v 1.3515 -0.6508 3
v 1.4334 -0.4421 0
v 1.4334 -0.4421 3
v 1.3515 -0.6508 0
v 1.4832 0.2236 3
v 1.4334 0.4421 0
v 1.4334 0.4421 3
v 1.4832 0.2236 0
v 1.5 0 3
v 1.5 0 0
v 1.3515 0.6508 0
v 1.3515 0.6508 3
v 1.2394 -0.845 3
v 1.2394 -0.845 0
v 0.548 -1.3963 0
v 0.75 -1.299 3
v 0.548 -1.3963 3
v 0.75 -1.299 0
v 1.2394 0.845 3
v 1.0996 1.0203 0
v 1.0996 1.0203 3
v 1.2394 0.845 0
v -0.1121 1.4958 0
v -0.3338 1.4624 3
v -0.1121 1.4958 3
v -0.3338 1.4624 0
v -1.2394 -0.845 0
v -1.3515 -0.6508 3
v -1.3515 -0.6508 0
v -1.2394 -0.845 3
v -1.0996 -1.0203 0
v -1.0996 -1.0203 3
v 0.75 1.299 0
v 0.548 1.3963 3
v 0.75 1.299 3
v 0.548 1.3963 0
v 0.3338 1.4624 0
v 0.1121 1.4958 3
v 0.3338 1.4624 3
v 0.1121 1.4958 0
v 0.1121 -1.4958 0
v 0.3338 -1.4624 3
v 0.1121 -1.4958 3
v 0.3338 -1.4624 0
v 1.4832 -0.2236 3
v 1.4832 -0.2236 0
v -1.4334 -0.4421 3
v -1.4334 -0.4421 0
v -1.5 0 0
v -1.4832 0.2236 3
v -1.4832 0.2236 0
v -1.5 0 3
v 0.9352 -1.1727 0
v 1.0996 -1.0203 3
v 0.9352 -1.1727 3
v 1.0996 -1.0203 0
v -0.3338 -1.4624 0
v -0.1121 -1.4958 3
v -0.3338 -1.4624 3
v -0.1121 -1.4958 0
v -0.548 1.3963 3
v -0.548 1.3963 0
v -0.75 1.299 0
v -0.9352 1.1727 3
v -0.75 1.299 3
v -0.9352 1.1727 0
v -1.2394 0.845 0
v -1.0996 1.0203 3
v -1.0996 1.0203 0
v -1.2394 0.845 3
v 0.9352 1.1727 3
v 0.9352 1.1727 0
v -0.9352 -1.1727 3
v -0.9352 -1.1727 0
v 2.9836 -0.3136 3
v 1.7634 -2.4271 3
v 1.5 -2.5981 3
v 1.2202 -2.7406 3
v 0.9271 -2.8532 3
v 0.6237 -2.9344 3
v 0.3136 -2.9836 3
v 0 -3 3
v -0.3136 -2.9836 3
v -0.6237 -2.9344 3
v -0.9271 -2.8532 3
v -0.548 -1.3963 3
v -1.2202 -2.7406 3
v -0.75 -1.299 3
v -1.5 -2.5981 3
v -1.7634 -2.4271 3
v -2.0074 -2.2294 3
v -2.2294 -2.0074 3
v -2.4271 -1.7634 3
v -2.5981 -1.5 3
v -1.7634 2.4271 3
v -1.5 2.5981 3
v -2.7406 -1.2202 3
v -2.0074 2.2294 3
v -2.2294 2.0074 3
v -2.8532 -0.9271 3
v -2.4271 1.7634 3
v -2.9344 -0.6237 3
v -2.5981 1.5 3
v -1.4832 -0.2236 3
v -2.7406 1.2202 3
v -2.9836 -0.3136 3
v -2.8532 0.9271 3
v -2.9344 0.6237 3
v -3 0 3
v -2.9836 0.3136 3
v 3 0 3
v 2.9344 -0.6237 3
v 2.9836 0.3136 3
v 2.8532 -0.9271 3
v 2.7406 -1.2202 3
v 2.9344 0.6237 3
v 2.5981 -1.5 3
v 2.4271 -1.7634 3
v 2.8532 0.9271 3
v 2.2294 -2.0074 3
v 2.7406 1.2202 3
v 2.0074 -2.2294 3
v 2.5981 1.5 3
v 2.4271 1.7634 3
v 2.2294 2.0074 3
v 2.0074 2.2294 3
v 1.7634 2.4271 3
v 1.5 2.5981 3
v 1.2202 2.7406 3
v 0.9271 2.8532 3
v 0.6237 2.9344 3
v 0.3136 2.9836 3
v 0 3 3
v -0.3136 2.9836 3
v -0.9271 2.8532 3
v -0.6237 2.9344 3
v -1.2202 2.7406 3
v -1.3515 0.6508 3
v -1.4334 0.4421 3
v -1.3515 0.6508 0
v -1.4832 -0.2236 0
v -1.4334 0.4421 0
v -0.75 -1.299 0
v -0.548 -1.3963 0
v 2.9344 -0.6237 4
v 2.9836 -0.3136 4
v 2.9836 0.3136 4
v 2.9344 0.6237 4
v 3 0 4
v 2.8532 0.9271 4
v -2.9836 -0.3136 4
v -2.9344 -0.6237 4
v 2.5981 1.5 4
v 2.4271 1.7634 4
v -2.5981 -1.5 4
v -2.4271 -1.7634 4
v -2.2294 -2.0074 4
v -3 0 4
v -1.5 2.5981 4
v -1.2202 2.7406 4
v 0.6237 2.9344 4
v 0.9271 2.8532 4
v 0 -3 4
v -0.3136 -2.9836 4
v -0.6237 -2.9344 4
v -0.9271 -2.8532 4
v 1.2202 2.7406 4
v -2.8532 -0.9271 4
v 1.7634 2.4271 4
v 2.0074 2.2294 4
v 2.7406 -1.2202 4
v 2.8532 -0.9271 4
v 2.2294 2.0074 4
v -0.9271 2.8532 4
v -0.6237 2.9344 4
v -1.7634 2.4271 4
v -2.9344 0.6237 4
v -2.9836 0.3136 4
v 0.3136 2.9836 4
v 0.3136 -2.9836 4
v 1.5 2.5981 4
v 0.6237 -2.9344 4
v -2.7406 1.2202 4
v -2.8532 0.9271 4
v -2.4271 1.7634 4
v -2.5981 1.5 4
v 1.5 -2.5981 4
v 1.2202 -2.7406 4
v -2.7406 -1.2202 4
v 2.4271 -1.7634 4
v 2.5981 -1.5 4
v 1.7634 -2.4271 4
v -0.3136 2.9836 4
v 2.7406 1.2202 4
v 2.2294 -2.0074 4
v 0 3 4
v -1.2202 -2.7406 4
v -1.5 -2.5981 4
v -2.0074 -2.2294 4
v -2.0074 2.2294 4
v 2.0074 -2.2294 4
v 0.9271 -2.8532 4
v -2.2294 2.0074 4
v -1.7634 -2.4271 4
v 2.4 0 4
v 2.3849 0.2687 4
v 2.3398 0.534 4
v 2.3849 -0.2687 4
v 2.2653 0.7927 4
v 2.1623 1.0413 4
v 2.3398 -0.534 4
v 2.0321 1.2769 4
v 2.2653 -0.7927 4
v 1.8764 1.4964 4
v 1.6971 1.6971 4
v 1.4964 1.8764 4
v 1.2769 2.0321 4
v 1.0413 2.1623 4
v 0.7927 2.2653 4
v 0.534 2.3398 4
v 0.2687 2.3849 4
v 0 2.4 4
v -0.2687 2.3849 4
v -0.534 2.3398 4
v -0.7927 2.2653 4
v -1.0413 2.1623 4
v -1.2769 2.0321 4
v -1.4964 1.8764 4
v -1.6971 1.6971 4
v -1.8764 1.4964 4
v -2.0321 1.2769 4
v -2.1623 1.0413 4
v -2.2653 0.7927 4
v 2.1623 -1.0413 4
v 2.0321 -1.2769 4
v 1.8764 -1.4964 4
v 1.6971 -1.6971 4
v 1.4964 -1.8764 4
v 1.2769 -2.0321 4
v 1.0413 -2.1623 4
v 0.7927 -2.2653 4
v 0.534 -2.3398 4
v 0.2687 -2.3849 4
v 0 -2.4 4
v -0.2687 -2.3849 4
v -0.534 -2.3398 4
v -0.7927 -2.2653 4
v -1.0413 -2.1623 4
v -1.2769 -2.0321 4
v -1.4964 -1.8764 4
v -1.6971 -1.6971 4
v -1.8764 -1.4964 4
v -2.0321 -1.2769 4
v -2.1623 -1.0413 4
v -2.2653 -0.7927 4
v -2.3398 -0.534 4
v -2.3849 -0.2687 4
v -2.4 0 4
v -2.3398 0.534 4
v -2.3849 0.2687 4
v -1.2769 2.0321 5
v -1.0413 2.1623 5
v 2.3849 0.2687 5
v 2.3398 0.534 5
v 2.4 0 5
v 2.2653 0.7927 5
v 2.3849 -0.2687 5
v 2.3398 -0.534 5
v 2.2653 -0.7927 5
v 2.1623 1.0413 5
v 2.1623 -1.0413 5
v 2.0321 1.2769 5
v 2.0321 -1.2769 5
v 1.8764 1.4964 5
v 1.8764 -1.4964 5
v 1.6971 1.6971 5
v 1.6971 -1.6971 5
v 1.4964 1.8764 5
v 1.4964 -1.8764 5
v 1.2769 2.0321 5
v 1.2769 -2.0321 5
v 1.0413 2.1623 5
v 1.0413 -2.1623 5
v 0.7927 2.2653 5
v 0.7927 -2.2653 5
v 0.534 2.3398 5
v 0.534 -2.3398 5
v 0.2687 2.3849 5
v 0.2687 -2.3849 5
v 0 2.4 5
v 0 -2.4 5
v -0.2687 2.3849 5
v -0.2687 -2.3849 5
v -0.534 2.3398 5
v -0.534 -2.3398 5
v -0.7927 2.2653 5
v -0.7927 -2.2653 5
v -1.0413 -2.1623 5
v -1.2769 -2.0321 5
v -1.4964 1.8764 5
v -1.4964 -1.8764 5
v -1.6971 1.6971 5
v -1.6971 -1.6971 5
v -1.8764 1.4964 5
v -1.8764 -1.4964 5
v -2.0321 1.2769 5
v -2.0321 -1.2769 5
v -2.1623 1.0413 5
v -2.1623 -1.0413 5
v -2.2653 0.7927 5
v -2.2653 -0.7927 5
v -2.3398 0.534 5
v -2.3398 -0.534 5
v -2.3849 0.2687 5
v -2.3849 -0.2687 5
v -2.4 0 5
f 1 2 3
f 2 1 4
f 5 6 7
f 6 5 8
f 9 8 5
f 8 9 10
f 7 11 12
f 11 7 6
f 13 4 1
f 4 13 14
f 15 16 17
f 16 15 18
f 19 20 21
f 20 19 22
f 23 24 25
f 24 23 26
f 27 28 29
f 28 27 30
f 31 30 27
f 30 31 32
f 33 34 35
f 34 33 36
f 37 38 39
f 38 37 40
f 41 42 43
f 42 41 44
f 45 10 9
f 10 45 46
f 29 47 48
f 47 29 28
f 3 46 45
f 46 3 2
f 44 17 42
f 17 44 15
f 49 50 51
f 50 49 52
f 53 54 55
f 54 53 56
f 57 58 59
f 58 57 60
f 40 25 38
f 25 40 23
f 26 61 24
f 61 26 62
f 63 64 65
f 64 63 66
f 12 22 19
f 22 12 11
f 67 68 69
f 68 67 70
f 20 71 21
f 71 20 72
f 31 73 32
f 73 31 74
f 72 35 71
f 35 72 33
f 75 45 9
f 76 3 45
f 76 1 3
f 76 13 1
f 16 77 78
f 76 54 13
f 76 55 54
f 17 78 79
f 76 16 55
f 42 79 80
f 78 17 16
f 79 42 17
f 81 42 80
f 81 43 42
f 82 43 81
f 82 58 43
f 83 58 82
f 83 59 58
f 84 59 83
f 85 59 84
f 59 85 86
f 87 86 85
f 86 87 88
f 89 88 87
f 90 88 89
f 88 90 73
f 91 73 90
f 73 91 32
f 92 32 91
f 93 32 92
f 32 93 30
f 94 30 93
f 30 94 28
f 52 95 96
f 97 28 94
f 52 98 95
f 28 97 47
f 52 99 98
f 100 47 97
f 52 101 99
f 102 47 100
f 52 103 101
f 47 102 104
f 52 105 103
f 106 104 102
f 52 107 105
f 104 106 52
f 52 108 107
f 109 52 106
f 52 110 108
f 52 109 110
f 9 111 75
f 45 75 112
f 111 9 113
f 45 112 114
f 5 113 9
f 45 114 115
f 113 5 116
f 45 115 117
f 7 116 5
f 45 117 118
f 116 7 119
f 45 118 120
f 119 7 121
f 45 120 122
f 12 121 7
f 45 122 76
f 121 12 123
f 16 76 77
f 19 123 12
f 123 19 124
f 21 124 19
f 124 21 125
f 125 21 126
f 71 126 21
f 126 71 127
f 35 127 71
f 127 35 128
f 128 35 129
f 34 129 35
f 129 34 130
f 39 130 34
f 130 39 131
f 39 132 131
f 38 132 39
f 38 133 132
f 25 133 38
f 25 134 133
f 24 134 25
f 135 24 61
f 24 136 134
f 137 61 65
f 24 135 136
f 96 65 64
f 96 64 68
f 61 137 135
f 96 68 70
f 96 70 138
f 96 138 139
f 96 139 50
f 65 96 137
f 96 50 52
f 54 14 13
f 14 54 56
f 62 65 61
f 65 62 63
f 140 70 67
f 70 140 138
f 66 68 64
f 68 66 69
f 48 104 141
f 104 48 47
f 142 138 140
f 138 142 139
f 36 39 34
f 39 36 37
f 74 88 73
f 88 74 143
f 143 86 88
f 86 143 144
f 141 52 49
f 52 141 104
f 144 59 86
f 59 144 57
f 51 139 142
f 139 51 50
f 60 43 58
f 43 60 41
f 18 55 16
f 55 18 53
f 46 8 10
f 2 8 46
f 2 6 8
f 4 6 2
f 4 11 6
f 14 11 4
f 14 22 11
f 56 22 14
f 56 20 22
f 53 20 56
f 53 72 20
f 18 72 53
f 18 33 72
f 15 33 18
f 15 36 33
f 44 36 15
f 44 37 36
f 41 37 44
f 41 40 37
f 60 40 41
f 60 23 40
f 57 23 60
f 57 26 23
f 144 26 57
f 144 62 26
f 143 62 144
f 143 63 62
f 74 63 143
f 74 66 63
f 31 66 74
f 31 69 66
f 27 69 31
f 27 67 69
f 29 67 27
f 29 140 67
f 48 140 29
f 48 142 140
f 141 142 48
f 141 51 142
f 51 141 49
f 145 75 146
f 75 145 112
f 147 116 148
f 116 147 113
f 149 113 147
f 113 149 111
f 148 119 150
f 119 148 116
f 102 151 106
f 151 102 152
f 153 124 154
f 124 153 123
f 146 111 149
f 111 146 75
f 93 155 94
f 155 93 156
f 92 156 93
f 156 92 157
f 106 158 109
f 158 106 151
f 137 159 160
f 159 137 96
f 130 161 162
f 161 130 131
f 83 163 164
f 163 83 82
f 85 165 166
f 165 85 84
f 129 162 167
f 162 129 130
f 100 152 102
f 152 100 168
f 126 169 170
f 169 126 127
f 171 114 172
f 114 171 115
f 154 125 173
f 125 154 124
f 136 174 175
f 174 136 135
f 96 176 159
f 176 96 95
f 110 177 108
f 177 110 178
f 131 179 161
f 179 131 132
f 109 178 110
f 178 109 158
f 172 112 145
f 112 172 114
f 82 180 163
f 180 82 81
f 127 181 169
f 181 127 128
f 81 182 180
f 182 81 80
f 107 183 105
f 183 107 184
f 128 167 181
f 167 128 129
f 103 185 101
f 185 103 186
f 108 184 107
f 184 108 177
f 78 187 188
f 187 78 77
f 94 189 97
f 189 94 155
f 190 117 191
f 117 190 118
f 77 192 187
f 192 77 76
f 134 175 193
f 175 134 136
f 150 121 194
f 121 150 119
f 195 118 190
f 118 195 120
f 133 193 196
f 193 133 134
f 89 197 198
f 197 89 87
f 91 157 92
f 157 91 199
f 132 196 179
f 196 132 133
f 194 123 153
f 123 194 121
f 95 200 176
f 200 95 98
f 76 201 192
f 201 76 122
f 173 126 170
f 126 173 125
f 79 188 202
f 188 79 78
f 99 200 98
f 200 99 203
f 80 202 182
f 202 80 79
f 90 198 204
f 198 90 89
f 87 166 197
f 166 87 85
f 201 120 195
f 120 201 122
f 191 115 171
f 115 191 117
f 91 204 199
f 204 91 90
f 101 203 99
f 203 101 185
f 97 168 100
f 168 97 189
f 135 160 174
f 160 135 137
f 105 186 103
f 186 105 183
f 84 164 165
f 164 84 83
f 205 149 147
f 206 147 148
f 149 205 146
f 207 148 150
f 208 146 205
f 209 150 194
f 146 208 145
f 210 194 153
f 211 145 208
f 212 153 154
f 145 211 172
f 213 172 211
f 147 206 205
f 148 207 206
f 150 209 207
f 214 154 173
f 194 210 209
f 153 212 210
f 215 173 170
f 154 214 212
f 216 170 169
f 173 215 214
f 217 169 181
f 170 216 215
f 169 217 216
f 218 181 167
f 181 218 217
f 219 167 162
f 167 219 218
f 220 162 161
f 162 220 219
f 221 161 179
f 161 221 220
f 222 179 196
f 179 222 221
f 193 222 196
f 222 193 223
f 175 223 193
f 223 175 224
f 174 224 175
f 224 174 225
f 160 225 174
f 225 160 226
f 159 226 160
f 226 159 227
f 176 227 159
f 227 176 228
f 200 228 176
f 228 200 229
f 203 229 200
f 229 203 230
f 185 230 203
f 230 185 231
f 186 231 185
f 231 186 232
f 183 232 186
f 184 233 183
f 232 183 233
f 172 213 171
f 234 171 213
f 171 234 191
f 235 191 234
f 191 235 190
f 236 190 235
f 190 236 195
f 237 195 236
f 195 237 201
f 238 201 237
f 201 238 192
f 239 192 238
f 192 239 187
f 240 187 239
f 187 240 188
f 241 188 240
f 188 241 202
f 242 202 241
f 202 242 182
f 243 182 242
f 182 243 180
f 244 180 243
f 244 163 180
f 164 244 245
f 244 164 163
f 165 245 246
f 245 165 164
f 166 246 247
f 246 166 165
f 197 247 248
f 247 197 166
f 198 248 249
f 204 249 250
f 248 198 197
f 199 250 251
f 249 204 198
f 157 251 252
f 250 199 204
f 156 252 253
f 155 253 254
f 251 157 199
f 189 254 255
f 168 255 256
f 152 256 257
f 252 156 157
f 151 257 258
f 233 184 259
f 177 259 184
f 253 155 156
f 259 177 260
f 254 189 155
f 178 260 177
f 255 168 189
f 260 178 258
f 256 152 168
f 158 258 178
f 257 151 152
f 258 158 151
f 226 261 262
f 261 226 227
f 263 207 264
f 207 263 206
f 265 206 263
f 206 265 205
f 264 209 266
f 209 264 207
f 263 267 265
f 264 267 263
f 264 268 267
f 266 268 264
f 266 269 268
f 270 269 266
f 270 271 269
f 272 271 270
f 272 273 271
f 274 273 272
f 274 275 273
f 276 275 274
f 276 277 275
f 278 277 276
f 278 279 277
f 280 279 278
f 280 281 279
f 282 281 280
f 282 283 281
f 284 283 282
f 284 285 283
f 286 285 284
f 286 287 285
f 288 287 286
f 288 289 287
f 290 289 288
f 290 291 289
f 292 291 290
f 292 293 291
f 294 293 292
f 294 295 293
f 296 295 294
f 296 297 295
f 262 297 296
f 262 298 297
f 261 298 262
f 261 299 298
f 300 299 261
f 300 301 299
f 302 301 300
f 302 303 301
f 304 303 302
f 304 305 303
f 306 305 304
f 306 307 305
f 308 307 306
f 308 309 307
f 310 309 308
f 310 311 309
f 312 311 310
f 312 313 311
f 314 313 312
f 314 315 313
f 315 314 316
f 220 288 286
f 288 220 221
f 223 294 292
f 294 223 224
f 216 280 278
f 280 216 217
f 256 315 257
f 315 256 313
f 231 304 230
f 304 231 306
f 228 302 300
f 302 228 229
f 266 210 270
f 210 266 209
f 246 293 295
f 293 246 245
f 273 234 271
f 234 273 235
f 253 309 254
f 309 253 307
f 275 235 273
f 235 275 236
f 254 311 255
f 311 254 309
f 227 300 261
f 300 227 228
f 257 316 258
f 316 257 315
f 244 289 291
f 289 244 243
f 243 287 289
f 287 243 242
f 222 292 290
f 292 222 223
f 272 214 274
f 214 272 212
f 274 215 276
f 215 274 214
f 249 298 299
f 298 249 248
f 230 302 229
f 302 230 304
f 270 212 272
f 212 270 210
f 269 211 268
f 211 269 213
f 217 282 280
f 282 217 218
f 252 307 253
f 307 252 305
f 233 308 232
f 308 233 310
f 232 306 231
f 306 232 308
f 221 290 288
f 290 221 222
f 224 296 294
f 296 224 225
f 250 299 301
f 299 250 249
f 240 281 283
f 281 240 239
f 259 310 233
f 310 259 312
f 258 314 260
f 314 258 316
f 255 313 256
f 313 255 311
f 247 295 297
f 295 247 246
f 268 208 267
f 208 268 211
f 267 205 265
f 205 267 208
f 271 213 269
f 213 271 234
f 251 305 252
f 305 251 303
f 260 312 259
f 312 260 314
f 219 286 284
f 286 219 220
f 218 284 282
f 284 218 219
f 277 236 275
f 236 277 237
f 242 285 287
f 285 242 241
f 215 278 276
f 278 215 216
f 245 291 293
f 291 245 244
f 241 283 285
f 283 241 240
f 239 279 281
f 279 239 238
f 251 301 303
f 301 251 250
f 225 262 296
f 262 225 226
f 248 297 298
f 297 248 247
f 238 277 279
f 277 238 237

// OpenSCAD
// part_id: cp-r4
// name: Rivet 3D x 3L
// source_drawing_ids: DRW-005
// units: mm
// revision: 0.1
// SPDX-License-Identifier: MIT

module part_cpr4() {
    union() {
        cylinder(d = 3.0, h = 3.0, center = false, $fn = 42);
        translate([0, 0, 3.0]) cylinder(d = 6.0, h = 1.0, center = false, $fn = 60);
        translate([0, 0, 4.0]) cylinder(d = 4.8, h = 1.0, center = false, $fn = 56);
    }
}

// ---- "main guard" ----
// Default to previewing when opened directly:
if (is_undef(__LIB_MODE__)) {
    part_cpr4();
}
